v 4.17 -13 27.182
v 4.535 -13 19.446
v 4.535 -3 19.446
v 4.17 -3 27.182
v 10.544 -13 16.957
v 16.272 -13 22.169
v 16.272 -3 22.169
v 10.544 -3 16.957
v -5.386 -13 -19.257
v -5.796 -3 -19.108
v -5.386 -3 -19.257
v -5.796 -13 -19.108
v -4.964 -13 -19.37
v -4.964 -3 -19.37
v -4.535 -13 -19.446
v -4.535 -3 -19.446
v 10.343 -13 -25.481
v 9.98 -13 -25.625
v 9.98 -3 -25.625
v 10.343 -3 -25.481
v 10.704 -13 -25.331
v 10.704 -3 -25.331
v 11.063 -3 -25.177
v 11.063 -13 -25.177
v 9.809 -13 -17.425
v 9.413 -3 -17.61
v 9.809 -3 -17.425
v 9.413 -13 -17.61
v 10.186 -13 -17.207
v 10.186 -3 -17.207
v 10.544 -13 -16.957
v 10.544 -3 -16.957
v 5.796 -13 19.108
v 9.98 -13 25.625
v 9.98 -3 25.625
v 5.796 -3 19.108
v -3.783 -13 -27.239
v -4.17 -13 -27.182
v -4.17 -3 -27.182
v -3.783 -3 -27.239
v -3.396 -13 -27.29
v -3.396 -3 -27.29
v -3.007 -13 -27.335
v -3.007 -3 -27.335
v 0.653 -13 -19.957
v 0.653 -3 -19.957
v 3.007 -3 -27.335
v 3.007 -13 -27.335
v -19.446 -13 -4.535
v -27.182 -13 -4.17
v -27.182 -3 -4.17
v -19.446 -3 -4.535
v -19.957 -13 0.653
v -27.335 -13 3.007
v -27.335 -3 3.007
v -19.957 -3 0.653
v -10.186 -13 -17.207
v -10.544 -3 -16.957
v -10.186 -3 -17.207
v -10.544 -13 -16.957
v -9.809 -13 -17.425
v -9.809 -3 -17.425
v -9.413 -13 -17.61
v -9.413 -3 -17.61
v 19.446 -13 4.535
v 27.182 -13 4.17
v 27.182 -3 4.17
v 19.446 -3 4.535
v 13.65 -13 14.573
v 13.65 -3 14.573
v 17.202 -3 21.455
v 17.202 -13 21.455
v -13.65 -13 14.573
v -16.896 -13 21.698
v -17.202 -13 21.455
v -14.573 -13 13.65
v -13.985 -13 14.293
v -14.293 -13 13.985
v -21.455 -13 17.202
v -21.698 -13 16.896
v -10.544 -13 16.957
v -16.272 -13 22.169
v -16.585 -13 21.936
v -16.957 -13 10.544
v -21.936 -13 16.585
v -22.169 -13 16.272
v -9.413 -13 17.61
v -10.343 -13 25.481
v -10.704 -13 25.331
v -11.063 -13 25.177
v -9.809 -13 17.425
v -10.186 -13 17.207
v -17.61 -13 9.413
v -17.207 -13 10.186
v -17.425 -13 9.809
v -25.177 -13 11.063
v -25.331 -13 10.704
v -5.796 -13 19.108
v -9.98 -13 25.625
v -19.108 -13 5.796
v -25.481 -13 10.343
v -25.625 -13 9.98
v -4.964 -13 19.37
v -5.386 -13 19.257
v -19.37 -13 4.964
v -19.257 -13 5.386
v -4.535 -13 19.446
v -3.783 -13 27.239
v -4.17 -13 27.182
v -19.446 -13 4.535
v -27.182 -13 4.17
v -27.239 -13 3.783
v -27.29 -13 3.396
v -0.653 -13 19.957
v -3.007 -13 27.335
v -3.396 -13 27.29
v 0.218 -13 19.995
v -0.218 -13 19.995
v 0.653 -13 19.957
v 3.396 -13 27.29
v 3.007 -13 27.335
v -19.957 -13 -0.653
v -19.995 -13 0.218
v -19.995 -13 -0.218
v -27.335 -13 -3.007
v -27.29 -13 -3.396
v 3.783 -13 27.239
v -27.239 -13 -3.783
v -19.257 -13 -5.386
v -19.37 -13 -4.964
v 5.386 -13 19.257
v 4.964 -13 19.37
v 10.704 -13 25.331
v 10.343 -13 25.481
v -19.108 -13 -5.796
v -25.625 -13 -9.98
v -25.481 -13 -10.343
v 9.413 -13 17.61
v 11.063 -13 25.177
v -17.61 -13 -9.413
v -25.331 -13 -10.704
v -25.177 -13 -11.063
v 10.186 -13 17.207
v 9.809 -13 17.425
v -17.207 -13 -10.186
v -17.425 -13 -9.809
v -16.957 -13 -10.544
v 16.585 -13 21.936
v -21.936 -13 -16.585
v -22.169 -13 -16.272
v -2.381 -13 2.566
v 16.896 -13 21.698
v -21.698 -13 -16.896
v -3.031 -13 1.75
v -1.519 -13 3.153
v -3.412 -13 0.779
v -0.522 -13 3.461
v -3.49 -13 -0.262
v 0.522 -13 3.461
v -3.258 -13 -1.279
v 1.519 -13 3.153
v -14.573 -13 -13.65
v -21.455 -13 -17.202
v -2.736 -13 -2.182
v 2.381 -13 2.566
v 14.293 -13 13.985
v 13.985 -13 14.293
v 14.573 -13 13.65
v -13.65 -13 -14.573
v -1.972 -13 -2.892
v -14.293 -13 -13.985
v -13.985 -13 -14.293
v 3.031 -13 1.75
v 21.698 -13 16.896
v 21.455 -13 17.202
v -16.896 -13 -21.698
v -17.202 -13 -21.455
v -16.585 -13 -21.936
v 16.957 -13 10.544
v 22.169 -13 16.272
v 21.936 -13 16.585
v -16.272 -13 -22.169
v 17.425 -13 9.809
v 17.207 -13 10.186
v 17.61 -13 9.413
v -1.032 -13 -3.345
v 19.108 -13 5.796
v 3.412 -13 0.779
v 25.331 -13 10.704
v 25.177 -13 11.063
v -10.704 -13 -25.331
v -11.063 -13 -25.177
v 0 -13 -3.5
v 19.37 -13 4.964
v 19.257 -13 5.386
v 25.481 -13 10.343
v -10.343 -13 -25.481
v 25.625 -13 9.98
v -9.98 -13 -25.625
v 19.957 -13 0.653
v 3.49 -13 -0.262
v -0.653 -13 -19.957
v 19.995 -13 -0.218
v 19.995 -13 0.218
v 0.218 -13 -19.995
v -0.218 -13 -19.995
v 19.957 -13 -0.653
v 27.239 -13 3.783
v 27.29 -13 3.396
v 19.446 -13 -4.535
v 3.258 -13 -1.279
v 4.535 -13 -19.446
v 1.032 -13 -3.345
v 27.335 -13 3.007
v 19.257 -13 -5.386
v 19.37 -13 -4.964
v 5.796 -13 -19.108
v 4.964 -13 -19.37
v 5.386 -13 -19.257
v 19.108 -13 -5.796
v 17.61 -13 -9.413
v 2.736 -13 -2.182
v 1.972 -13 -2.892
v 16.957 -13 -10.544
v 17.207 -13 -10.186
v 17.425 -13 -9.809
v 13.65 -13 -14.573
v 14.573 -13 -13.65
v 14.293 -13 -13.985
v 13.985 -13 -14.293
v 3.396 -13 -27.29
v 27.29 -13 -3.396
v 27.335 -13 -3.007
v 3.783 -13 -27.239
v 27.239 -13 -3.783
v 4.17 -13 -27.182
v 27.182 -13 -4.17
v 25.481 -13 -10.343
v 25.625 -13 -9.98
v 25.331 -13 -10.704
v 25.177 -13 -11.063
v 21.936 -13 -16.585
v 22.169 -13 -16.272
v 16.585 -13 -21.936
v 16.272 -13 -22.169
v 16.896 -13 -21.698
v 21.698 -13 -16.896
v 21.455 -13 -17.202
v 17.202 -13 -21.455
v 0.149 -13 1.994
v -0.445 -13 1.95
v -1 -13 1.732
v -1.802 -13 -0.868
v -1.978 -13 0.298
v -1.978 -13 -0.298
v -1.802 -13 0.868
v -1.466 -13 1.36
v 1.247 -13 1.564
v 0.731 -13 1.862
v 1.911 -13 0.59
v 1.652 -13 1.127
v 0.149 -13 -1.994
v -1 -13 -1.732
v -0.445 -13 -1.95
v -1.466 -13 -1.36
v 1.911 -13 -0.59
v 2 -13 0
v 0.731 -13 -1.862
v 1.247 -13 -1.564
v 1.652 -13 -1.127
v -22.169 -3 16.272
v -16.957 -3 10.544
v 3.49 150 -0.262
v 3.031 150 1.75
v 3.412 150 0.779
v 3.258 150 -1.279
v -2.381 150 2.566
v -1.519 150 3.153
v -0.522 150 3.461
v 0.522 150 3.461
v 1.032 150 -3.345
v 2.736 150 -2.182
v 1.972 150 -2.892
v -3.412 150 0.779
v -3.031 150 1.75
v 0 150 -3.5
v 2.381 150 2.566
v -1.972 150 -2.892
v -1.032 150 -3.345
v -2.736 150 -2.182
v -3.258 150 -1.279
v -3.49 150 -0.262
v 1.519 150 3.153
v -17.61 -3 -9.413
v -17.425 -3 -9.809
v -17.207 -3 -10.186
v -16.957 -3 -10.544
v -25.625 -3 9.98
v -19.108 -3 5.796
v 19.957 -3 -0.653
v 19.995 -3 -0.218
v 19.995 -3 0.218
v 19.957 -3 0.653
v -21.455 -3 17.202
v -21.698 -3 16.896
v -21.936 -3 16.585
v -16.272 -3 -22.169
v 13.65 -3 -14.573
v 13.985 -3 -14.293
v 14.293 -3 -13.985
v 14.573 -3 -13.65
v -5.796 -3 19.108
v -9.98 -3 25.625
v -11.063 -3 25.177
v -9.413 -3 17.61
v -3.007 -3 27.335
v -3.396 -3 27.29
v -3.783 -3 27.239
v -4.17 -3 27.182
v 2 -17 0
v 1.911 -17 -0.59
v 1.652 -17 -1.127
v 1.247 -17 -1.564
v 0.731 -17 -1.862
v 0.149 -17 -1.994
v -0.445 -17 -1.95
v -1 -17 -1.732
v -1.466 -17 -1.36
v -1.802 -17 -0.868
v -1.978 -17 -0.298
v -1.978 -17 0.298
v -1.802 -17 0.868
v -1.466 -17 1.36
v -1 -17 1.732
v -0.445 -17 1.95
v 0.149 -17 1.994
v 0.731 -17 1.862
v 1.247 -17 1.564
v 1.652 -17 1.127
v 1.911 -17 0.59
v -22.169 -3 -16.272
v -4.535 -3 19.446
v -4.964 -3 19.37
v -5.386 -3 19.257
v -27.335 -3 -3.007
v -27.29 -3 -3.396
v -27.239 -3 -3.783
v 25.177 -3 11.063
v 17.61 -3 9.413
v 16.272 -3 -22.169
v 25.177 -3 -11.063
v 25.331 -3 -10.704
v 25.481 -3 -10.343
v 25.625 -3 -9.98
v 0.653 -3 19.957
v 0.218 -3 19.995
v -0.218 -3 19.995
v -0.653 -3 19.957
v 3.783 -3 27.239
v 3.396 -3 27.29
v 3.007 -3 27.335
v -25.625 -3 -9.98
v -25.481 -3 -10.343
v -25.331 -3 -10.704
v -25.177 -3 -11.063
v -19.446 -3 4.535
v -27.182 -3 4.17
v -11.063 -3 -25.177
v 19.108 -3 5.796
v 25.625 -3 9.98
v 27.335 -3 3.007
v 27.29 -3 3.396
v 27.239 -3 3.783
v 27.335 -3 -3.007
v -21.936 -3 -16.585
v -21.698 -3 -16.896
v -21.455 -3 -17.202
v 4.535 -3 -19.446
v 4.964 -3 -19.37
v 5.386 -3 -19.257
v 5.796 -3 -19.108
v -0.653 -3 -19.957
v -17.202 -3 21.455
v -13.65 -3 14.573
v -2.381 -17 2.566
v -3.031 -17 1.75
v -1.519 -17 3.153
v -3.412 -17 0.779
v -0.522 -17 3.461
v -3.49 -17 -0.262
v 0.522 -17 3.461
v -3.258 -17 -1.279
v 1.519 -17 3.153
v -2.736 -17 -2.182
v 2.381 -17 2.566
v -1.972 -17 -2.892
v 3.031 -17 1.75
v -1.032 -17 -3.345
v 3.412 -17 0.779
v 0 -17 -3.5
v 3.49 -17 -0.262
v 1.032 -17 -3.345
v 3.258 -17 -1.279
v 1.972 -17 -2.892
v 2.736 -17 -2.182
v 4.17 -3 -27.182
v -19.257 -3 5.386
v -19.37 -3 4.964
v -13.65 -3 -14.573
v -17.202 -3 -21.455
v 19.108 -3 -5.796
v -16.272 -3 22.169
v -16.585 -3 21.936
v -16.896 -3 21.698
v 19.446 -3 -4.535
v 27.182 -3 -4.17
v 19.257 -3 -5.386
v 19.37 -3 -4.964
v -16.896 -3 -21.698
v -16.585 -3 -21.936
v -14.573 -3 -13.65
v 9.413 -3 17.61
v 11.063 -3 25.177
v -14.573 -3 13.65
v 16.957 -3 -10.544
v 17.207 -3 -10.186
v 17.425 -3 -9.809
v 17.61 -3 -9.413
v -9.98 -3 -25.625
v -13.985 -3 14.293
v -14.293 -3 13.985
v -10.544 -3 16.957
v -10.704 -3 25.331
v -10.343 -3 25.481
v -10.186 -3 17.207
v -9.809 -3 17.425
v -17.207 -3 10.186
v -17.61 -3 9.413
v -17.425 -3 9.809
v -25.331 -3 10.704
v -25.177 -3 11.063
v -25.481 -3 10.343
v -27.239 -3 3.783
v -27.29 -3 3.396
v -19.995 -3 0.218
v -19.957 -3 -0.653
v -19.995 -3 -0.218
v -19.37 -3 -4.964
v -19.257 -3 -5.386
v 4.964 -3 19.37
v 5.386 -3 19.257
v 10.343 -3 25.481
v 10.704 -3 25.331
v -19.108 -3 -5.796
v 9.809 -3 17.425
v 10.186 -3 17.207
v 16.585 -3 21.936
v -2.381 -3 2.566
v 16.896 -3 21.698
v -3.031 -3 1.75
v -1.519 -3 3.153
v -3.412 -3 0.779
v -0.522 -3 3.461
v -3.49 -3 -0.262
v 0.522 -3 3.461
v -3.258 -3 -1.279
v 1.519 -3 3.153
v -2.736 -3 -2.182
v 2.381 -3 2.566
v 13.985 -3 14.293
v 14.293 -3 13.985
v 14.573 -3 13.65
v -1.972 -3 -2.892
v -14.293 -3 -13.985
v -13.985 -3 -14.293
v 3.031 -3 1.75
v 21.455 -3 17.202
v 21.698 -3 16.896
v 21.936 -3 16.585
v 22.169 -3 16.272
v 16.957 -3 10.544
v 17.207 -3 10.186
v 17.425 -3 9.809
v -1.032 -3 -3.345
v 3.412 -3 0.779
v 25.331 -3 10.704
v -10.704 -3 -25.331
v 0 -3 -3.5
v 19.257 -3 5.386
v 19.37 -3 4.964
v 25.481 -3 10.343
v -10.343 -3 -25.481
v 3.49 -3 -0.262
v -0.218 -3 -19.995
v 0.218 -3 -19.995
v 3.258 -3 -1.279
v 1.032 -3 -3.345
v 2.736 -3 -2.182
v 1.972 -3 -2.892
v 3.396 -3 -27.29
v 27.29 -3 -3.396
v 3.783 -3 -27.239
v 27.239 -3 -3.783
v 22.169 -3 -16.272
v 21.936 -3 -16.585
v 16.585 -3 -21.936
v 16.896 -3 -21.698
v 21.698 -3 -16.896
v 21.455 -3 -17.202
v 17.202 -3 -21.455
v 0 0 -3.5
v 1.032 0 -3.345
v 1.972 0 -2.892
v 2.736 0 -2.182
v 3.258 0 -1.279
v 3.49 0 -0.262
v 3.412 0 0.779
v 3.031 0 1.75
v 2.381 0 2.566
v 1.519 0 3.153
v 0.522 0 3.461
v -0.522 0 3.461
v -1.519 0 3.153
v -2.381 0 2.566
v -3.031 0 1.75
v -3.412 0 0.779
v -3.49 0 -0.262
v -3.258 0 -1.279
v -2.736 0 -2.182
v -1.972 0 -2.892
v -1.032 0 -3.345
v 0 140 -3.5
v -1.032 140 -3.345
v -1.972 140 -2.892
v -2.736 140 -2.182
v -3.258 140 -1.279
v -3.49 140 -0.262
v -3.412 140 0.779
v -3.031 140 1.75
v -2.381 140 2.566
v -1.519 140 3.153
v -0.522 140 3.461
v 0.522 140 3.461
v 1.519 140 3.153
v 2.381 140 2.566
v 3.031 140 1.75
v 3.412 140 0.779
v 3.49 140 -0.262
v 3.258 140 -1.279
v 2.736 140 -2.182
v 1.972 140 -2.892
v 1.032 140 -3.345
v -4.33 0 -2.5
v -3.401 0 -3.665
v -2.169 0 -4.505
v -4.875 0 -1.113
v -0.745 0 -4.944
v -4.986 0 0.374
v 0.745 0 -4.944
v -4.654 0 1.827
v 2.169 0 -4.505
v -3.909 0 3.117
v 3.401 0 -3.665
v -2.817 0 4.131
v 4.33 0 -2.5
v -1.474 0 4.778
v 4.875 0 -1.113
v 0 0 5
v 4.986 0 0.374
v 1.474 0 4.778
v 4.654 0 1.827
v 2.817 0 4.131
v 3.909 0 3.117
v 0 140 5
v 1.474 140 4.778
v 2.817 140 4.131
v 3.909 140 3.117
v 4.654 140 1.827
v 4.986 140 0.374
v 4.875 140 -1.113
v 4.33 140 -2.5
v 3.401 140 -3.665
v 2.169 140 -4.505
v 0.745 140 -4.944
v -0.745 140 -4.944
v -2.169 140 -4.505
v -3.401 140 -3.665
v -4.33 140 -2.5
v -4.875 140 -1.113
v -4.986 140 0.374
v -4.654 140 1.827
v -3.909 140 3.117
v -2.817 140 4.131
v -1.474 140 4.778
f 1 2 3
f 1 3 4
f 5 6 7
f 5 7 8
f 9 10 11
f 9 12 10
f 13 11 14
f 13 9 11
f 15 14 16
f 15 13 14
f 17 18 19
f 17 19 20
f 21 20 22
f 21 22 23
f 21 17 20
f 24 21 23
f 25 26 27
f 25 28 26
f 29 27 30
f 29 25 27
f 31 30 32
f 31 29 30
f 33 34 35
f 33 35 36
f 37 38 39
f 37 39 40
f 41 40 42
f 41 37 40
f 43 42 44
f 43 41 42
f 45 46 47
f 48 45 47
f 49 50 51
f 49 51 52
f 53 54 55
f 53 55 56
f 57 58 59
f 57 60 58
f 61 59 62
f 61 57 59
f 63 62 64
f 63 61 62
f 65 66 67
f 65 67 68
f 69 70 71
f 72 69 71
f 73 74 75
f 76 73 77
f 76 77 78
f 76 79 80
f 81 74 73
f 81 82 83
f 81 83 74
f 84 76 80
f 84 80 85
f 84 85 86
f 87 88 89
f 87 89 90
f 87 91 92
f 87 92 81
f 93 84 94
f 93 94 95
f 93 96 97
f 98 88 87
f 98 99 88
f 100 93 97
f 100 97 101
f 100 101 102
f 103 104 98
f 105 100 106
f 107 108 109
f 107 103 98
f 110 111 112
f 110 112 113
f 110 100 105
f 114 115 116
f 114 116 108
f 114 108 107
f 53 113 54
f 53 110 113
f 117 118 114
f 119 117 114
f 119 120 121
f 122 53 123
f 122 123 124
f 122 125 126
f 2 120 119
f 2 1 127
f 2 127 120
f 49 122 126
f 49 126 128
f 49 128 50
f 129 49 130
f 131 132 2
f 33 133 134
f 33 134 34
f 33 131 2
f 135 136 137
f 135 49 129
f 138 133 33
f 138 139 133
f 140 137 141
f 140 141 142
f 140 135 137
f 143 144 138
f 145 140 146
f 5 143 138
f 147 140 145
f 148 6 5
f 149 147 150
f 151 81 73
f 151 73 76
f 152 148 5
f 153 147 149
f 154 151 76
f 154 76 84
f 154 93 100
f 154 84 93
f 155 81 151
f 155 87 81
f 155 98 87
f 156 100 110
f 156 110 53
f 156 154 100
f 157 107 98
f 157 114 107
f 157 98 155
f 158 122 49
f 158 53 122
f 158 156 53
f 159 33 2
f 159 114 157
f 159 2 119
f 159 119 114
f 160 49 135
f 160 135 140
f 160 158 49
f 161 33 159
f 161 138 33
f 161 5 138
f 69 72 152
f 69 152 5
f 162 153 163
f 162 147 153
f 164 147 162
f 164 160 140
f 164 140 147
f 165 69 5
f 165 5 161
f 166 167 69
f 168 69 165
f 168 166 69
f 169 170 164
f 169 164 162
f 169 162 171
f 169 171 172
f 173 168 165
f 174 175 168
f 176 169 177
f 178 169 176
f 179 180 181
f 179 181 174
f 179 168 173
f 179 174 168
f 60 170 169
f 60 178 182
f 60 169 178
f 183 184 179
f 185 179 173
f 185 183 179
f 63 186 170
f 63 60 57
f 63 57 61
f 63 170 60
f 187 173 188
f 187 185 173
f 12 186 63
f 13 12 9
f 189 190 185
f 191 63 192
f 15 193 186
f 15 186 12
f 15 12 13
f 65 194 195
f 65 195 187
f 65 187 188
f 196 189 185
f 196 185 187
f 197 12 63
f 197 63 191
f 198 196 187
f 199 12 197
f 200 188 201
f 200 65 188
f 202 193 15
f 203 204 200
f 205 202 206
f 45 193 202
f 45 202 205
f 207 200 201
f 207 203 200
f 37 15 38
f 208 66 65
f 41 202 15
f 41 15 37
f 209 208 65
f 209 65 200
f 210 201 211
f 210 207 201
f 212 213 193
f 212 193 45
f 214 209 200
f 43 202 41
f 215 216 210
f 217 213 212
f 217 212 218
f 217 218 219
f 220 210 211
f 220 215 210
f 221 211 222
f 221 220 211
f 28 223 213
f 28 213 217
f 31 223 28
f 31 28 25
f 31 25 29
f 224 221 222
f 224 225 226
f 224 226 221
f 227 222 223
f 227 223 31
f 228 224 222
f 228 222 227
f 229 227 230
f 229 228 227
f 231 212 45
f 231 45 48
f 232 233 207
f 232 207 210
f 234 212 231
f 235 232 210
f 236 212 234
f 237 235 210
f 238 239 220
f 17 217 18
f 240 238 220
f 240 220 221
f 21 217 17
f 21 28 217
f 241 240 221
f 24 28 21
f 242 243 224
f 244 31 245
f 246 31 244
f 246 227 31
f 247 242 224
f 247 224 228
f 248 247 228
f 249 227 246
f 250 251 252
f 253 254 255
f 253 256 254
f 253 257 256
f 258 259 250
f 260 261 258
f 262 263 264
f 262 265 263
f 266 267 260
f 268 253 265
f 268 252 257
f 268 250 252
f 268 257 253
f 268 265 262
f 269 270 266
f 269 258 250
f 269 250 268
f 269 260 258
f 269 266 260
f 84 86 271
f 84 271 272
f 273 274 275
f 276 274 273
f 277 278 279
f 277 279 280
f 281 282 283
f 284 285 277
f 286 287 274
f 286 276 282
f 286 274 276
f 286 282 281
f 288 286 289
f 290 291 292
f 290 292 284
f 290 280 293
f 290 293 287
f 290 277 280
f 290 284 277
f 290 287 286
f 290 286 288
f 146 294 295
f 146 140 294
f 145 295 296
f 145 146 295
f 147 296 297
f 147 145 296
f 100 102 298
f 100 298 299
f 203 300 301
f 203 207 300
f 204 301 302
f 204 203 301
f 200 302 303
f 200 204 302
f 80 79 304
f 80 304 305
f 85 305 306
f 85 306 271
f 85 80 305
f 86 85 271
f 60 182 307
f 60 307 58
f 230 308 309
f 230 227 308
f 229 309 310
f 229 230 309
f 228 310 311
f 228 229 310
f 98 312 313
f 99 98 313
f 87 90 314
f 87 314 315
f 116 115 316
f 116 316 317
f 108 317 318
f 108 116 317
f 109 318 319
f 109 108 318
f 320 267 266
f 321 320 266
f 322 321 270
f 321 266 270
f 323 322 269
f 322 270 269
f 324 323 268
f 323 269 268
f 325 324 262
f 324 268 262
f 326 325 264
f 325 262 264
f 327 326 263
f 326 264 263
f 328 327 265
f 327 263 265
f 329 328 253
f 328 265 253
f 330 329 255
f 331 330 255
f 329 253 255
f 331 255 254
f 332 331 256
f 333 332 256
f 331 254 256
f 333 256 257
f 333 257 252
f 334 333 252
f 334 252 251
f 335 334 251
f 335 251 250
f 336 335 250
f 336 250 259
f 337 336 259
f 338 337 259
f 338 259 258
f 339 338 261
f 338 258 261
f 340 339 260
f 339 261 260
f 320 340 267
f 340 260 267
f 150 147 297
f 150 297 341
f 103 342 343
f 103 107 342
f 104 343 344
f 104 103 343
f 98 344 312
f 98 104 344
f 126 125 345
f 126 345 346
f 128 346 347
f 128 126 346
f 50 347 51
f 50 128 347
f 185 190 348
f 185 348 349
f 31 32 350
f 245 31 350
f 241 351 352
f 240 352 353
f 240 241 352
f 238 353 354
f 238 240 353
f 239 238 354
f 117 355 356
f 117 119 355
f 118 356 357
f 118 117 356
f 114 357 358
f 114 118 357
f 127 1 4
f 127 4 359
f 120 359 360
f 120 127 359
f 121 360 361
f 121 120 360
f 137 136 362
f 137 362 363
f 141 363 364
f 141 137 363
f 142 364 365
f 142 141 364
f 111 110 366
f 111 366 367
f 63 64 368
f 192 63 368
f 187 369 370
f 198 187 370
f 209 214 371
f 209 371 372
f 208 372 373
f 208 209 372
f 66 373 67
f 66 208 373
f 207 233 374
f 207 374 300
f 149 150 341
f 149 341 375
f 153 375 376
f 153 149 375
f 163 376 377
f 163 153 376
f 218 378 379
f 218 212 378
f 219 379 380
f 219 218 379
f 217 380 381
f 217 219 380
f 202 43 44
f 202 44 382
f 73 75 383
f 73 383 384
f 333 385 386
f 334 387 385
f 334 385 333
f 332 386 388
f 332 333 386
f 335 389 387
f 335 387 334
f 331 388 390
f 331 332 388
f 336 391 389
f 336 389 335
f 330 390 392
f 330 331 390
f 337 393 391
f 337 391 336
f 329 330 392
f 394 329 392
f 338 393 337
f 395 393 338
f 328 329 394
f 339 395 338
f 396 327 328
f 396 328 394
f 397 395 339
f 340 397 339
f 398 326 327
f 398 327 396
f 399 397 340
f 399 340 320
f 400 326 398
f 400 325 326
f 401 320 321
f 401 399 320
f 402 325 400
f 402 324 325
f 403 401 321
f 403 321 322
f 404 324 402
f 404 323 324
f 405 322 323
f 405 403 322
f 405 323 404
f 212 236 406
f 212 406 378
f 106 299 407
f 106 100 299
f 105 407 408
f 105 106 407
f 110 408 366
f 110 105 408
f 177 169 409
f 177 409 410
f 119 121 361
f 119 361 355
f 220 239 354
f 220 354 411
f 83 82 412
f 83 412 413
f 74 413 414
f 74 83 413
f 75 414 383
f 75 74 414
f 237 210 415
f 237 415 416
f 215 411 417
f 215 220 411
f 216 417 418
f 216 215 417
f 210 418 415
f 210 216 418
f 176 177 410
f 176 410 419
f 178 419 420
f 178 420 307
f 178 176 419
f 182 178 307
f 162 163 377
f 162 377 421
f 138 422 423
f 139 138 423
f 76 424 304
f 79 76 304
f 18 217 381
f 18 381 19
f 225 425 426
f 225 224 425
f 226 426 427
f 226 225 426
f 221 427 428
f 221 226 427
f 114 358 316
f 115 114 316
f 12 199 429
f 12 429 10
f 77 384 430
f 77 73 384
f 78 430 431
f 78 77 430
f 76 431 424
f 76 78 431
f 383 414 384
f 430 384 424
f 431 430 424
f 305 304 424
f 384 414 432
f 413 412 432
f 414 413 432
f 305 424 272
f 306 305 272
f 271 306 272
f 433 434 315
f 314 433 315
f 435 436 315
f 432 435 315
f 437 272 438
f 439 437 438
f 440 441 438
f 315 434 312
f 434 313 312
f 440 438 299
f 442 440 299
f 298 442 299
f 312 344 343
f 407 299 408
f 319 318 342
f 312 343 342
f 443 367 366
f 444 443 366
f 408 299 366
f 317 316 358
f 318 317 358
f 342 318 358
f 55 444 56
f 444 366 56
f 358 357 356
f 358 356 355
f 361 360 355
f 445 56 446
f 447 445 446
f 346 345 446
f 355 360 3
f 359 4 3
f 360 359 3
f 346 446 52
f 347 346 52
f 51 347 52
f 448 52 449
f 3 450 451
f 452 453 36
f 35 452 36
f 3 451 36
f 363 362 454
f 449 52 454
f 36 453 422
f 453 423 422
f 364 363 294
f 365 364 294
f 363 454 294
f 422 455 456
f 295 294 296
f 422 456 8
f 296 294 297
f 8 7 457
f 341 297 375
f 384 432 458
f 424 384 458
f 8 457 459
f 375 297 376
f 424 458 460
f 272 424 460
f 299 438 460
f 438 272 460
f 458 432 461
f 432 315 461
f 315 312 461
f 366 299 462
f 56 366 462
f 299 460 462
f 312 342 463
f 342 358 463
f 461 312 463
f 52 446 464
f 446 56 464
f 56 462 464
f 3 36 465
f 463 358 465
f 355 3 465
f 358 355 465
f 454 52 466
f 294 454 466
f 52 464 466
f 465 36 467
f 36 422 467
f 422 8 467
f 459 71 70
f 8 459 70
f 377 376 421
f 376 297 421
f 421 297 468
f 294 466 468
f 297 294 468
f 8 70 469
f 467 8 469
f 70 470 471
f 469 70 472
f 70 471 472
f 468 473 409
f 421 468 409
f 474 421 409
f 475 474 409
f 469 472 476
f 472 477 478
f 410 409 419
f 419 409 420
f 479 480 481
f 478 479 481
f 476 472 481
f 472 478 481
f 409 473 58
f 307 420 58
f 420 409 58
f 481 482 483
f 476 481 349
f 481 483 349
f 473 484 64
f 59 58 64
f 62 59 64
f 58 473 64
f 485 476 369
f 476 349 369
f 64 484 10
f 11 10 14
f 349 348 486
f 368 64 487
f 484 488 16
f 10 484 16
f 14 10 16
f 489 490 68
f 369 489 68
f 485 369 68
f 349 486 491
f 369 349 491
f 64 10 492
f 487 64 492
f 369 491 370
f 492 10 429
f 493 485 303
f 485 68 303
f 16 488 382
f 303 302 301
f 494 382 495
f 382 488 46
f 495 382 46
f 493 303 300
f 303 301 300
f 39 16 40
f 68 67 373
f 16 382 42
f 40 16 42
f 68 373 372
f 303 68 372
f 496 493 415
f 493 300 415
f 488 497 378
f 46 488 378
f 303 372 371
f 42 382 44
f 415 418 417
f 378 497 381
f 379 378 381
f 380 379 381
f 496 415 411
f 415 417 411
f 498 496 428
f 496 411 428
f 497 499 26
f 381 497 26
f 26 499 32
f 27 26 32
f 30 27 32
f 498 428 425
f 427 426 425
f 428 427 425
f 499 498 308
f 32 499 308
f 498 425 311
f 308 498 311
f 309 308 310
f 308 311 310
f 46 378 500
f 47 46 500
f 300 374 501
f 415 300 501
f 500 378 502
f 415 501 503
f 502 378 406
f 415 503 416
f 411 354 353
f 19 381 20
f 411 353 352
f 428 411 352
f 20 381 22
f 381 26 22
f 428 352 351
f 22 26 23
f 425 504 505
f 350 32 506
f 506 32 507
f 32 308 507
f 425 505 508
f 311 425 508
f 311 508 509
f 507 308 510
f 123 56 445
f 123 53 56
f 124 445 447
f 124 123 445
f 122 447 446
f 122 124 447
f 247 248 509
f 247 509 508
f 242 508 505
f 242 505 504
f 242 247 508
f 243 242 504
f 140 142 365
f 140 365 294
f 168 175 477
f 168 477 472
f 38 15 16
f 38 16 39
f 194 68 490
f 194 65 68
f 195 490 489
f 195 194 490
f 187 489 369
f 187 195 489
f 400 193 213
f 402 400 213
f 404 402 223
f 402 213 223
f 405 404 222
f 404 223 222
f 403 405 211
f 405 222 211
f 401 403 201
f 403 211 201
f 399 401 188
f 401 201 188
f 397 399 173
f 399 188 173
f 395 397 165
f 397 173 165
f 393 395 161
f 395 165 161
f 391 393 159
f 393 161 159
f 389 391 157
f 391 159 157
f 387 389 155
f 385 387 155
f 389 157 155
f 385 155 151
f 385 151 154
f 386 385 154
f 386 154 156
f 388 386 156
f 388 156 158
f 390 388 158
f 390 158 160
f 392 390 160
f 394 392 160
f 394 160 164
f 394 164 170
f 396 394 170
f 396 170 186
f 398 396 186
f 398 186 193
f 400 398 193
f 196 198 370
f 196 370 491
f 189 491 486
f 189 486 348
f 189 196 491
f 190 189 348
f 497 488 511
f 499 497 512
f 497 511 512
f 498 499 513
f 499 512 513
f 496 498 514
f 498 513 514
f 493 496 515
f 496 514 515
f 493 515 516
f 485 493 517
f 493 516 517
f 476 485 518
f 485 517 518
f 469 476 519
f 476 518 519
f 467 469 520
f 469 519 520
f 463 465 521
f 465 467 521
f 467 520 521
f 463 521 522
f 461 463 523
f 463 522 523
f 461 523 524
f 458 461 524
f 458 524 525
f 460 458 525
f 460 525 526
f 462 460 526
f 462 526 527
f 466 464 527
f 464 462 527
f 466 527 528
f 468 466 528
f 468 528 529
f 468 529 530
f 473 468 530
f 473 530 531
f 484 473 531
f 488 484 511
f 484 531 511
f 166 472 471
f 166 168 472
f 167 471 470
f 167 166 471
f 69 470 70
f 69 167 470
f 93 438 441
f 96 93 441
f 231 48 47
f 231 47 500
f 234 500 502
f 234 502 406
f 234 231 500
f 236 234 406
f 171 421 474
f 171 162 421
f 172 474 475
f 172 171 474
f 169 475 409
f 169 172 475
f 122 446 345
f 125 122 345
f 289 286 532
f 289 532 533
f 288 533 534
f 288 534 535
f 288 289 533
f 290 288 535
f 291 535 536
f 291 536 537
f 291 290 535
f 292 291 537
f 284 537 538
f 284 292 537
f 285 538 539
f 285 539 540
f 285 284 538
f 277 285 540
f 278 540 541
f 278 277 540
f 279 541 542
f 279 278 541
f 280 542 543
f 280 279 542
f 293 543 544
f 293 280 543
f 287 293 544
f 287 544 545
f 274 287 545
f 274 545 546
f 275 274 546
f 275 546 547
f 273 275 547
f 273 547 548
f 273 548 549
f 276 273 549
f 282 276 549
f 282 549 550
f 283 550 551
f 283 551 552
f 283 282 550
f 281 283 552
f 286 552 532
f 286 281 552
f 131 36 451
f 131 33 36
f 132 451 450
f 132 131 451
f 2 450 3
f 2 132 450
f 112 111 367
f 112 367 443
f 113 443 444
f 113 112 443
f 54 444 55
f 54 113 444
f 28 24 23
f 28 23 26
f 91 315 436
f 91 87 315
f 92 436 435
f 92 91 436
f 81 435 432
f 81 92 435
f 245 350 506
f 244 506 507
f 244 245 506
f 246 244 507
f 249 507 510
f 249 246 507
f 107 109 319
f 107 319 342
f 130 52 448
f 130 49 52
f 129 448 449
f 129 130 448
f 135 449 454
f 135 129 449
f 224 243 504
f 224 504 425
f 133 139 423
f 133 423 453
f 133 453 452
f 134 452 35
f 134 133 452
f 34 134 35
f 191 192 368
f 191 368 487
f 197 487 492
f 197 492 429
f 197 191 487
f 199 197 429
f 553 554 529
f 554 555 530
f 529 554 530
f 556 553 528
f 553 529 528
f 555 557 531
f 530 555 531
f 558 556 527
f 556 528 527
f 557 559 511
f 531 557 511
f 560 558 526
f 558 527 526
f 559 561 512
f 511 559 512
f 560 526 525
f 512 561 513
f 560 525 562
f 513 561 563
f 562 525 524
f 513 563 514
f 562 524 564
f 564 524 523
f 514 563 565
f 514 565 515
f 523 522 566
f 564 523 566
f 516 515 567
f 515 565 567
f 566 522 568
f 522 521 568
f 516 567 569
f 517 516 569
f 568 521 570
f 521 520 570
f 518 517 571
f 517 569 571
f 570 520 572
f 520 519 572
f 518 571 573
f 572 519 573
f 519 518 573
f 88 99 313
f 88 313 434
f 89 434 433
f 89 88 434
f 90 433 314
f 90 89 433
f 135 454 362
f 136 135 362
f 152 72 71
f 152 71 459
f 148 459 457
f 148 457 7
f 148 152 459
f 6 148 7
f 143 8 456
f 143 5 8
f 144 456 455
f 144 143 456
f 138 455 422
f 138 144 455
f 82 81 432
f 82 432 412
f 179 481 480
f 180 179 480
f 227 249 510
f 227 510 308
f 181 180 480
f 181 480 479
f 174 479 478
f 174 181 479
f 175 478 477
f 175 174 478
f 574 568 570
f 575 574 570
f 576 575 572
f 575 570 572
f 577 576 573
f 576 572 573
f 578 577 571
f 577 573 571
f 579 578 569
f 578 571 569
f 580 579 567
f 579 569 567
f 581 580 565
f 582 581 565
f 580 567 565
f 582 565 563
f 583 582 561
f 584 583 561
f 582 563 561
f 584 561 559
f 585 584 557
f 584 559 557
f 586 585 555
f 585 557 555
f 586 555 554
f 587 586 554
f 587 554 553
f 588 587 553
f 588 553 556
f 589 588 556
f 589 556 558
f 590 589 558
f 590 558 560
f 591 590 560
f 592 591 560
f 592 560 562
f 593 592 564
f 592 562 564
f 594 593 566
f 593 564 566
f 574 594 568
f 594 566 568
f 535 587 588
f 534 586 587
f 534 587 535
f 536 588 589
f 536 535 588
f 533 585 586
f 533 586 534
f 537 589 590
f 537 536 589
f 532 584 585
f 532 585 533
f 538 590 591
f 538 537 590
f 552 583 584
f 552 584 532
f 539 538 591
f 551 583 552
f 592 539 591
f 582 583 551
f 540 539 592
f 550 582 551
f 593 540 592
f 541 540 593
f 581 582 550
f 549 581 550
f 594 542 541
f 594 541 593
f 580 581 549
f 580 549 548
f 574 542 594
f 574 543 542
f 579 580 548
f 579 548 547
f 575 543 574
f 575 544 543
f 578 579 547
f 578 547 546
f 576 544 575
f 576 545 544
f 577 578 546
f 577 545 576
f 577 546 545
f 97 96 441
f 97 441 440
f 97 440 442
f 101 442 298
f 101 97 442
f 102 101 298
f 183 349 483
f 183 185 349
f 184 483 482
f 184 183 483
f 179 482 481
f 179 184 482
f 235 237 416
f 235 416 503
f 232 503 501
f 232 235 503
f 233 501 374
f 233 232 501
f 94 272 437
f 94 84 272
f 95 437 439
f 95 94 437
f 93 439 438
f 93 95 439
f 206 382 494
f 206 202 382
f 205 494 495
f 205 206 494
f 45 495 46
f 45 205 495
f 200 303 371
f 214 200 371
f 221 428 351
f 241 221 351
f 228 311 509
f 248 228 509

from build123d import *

# Parameters (mm, degrees)
SKETCH1_R                 = 5
CENTERSCREW_DEPTH         = 140
SKETCH2_R                 = 3.5
TEETHWHEELCONNECTOR_DEPTH = 17
INNERHOLE_D               = 4
INNERHOLE_DEPTH           = 10
INNERHOLE_TIP             = 1.201721238
SKETCH5_R                 = 27.5
BOSS_EXTRUDE3_DEPTH       = 5
CUT_EXTRUDE5_DEPTH        = 5
CIRPATTERN1_COUNT         = 24
BOSS_EXTRUDE4_START       = 10
SKETCH10_R                = 3.5
BOSS_EXTRUDE4_DEPTH       = 10


with BuildPart() as part:
    # Sketch1 → centerScrew (new body)
    with BuildSketch(Plane(origin=(0, 0, 0), x_dir=(1, 0, 0), z_dir=(0, 1, 0))):
        with Locations(Location((0, 0, 0), (0, 0, 270))):
            Circle(SKETCH1_R)
    extrude(amount=CENTERSCREW_DEPTH)

    # Sketch2 → teethWheelConnector (add)
    with BuildSketch(Plane.XZ):
        with Locations(Location((0, 0, 0), (0, 0, 270))):
            Circle(SKETCH2_R)
    extrude(amount=TEETHWHEELCONNECTOR_DEPTH)

    # innerHole
    with Locations(Plane(origin=(0, -17, 0), x_dir=(-1, 0, 0), z_dir=(0, -1, 0))):
        with Locations((0, 0)):
            Hole(INNERHOLE_D / 2, depth=INNERHOLE_DEPTH)
            with Locations((0, 0, -(INNERHOLE_DEPTH + INNERHOLE_TIP / 2))):  # 118° drill point
                Cone(0, INNERHOLE_D / 2, INNERHOLE_TIP, mode=Mode.SUBTRACT)

    # Sketch5 → Boss-Extrude3 (add, symmetric)
    with BuildSketch(Plane(origin=(0, -8, 0), x_dir=(-1, 0, 0), z_dir=(0, -1, 0))):
        with Locations(Location((0, 0, 0), (0, 0, 90))):
            Circle(SKETCH5_R)
    extrude(amount=BOSS_EXTRUDE3_DEPTH, both=True)

    # Sketch9 → Cut-Extrude5 (cut, symmetric)
    with BuildSketch(Plane(origin=(0, -8, 0), x_dir=(-1, 0, 0), z_dir=(0, -1, 0))):
        with BuildLine():
            Line((4.013866942, 30.488346334), (0.652630961, 19.957224307))
            ThreePointArc((0.652630961, 19.957224307), (0, 20), (-0.652630961, 19.957224307))
            Line((-0.652630961, 19.957224307), (-4.013866942, 30.488346334))
            ThreePointArc((-4.013866942, 30.488346334), (0, 31), (4.013866942, 30.488346334))
        make_face()
    cut_extrude5 = extrude(amount=CUT_EXTRUDE5_DEPTH, both=True, mode=Mode.SUBTRACT)

    # CirPattern1: Cut-Extrude5 ×24 about axis
    cirpattern1_axis = Axis((0, 0, 0), (0, 1, 0))
    for i in range(1, CIRPATTERN1_COUNT):
        add(cut_extrude5.rotate(cirpattern1_axis, i * 360 / CIRPATTERN1_COUNT), mode=Mode.SUBTRACT)

    # Sketch10 → Boss-Extrude4 (add)
    with BuildSketch(Plane(origin=(0, 140, 0), x_dir=(1, 0, 0), z_dir=(0, 1, 0)).offset(BOSS_EXTRUDE4_START)):
        with Locations(Location((0, 0, 0), (0, 0, 90))):
            Circle(SKETCH10_R)
    extrude(amount=-BOSS_EXTRUDE4_DEPTH)


solid = part.part
